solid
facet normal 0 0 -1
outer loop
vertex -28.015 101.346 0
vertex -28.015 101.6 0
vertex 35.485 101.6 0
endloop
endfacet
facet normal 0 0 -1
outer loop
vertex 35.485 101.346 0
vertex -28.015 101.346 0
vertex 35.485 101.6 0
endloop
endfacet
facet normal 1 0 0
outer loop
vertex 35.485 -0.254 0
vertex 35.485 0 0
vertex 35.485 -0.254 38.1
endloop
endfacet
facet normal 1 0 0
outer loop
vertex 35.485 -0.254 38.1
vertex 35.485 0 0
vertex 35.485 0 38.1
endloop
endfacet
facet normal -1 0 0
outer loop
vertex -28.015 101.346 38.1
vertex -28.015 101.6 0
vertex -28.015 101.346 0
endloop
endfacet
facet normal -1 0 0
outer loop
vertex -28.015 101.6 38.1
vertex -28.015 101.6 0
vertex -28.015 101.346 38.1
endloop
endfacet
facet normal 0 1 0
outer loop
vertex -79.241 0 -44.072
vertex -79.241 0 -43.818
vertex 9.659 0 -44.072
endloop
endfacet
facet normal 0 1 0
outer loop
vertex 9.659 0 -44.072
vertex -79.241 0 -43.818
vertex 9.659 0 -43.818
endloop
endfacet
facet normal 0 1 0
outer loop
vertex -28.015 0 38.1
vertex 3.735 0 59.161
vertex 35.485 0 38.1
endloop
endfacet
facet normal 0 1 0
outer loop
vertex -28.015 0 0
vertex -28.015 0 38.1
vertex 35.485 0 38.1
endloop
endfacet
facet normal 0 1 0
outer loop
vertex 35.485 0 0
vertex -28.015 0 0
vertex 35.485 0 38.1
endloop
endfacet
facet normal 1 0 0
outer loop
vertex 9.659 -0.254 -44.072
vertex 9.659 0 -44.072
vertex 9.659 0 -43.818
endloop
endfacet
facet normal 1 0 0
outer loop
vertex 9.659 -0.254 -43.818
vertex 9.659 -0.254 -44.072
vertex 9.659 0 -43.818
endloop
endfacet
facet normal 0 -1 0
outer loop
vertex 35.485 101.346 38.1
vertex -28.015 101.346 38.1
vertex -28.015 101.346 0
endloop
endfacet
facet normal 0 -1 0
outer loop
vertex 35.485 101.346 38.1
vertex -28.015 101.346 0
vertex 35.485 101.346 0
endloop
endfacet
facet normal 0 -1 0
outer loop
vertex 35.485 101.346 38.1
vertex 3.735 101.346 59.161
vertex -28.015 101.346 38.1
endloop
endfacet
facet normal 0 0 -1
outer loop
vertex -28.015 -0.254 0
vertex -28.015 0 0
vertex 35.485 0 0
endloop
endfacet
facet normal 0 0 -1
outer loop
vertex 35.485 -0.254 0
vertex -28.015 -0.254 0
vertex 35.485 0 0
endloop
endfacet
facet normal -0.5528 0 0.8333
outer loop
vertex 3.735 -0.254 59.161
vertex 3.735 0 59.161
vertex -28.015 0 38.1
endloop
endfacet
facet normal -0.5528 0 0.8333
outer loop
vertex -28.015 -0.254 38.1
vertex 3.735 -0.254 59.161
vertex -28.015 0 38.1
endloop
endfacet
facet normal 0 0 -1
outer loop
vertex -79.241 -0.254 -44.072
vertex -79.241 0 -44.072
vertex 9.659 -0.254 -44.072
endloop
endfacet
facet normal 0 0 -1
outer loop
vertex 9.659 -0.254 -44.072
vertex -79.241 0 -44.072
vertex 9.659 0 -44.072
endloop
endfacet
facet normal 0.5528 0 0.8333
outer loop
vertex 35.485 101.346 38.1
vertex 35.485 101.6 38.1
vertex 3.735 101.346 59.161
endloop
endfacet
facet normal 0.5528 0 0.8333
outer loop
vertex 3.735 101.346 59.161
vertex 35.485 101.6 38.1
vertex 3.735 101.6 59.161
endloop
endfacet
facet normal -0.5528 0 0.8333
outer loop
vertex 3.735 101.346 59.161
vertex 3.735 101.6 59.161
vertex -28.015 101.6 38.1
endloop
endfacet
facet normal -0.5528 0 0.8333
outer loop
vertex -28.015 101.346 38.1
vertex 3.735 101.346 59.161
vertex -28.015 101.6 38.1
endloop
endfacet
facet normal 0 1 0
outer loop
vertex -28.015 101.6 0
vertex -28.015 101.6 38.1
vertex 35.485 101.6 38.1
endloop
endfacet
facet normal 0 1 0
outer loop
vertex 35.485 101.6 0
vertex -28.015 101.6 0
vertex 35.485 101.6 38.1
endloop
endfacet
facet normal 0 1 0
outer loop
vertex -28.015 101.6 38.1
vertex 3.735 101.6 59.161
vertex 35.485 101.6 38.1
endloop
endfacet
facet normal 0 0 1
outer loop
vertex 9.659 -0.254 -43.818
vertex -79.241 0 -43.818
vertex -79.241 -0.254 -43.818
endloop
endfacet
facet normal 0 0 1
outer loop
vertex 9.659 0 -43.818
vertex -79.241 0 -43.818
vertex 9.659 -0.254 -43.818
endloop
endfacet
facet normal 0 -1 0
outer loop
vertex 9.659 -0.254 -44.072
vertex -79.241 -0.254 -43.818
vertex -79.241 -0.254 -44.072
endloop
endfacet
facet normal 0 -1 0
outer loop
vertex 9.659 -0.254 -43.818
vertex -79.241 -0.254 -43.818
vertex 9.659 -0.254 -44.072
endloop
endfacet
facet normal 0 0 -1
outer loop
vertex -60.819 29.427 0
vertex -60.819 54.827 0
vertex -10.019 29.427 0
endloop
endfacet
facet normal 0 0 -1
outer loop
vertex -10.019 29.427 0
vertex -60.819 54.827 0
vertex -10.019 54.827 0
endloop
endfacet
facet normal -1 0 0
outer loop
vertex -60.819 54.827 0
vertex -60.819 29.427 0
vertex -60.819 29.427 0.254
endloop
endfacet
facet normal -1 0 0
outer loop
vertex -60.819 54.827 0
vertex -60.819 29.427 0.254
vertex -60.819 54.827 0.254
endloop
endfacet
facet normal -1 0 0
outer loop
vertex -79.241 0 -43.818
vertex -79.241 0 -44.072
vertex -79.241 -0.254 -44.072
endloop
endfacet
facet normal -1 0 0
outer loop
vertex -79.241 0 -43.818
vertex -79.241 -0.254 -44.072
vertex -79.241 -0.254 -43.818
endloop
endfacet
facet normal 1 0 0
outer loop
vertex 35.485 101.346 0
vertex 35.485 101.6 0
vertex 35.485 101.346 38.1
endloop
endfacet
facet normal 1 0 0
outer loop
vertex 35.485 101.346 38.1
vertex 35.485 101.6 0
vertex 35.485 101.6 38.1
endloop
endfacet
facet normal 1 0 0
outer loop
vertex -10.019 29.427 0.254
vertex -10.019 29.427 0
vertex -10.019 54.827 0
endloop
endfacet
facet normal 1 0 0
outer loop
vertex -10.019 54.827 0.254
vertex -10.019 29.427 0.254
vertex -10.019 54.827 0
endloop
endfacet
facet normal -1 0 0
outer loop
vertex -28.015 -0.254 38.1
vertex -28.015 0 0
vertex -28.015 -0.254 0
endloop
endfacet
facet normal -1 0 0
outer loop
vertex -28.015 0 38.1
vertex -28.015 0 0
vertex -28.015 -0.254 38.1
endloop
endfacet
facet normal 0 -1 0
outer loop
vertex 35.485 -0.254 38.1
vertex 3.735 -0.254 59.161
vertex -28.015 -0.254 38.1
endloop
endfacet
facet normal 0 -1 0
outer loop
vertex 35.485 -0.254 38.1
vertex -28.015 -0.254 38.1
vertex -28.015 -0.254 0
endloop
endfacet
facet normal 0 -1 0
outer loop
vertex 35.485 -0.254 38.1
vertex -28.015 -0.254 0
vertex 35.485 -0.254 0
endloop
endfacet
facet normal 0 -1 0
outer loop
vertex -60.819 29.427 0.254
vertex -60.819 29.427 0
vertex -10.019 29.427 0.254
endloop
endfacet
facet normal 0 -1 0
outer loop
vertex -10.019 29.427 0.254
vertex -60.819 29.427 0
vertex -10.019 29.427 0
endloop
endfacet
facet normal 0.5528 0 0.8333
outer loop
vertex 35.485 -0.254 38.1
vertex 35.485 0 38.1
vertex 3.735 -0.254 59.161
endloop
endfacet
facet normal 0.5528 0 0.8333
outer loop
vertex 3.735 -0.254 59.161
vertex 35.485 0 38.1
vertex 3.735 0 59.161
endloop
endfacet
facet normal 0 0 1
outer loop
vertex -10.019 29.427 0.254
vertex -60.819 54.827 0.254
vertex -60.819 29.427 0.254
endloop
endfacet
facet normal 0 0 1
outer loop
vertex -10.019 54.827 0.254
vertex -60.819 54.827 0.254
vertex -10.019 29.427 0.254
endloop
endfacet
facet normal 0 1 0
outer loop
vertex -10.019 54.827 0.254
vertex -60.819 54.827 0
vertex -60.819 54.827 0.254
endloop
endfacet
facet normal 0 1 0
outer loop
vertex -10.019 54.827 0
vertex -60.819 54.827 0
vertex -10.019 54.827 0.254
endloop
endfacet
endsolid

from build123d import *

# Parameters (mm, degrees)
F0_W     = 63.5
F0_H     = 38.1
F3_DEPTH = 0.254
F2_W     = 63.5
F2_H     = 38.1
F4_DEPTH = 0.254
F5_W     = 88.9
F5_H     = 0.254
F6_DEPTH = 0.254
F7_DEPTH = 0.254
F8_W     = 50.8
F8_H     = 25.4
F9_DEPTH = 0.254


with BuildPart() as f3:
    # F0 (on Front) → F3 (new body)
    with BuildSketch(Plane.XZ):
        Polygon((3.735292923, 59.1605674188), (-28.014707077, 38.1), (35.485292923, 38.1), align=None)
        with Locations((3.735292923, 19.05)):
            Rectangle(F0_W, F0_H)
    extrude(amount=F3_DEPTH)


with BuildPart() as f4:
    # F2 (on offset) → F4 (new body)
    with BuildSketch(Plane.XZ.offset(-101.6)):
        with Locations((3.7352986, 19.05)):
            Rectangle(F2_W, F2_H)
        Polygon((-28.0147014, 38.1), (35.4852986, 38.1), (3.7352986, 59.1605674188), align=None)
    extrude(amount=F4_DEPTH)


with BuildPart() as f6:
    # F5 (on Front) → F6 (new body)
    with BuildSketch(Plane.XZ):
        with Locations((-34.7909054301, -43.9452975988)):
            Rectangle(F5_W, F5_H)
    extrude(amount=F6_DEPTH)

    # F5 (on Front) → F7 (join)
    with BuildSketch(Plane.XZ):
        with Locations((-34.7909054301, -43.9452975988)):
            Rectangle(F5_W, F5_H)
    extrude(amount=F7_DEPTH)


with BuildPart() as f9:
    # F8 (on Top) → F9 (new body)
    with BuildSketch(Plane.XY):
        with Locations((-35.41862064, 42.1265598059)):
            Rectangle(F8_W, F8_H)
    extrude(amount=F9_DEPTH)


solid = Compound([f3.part, f4.part, f6.part, f9.part])
